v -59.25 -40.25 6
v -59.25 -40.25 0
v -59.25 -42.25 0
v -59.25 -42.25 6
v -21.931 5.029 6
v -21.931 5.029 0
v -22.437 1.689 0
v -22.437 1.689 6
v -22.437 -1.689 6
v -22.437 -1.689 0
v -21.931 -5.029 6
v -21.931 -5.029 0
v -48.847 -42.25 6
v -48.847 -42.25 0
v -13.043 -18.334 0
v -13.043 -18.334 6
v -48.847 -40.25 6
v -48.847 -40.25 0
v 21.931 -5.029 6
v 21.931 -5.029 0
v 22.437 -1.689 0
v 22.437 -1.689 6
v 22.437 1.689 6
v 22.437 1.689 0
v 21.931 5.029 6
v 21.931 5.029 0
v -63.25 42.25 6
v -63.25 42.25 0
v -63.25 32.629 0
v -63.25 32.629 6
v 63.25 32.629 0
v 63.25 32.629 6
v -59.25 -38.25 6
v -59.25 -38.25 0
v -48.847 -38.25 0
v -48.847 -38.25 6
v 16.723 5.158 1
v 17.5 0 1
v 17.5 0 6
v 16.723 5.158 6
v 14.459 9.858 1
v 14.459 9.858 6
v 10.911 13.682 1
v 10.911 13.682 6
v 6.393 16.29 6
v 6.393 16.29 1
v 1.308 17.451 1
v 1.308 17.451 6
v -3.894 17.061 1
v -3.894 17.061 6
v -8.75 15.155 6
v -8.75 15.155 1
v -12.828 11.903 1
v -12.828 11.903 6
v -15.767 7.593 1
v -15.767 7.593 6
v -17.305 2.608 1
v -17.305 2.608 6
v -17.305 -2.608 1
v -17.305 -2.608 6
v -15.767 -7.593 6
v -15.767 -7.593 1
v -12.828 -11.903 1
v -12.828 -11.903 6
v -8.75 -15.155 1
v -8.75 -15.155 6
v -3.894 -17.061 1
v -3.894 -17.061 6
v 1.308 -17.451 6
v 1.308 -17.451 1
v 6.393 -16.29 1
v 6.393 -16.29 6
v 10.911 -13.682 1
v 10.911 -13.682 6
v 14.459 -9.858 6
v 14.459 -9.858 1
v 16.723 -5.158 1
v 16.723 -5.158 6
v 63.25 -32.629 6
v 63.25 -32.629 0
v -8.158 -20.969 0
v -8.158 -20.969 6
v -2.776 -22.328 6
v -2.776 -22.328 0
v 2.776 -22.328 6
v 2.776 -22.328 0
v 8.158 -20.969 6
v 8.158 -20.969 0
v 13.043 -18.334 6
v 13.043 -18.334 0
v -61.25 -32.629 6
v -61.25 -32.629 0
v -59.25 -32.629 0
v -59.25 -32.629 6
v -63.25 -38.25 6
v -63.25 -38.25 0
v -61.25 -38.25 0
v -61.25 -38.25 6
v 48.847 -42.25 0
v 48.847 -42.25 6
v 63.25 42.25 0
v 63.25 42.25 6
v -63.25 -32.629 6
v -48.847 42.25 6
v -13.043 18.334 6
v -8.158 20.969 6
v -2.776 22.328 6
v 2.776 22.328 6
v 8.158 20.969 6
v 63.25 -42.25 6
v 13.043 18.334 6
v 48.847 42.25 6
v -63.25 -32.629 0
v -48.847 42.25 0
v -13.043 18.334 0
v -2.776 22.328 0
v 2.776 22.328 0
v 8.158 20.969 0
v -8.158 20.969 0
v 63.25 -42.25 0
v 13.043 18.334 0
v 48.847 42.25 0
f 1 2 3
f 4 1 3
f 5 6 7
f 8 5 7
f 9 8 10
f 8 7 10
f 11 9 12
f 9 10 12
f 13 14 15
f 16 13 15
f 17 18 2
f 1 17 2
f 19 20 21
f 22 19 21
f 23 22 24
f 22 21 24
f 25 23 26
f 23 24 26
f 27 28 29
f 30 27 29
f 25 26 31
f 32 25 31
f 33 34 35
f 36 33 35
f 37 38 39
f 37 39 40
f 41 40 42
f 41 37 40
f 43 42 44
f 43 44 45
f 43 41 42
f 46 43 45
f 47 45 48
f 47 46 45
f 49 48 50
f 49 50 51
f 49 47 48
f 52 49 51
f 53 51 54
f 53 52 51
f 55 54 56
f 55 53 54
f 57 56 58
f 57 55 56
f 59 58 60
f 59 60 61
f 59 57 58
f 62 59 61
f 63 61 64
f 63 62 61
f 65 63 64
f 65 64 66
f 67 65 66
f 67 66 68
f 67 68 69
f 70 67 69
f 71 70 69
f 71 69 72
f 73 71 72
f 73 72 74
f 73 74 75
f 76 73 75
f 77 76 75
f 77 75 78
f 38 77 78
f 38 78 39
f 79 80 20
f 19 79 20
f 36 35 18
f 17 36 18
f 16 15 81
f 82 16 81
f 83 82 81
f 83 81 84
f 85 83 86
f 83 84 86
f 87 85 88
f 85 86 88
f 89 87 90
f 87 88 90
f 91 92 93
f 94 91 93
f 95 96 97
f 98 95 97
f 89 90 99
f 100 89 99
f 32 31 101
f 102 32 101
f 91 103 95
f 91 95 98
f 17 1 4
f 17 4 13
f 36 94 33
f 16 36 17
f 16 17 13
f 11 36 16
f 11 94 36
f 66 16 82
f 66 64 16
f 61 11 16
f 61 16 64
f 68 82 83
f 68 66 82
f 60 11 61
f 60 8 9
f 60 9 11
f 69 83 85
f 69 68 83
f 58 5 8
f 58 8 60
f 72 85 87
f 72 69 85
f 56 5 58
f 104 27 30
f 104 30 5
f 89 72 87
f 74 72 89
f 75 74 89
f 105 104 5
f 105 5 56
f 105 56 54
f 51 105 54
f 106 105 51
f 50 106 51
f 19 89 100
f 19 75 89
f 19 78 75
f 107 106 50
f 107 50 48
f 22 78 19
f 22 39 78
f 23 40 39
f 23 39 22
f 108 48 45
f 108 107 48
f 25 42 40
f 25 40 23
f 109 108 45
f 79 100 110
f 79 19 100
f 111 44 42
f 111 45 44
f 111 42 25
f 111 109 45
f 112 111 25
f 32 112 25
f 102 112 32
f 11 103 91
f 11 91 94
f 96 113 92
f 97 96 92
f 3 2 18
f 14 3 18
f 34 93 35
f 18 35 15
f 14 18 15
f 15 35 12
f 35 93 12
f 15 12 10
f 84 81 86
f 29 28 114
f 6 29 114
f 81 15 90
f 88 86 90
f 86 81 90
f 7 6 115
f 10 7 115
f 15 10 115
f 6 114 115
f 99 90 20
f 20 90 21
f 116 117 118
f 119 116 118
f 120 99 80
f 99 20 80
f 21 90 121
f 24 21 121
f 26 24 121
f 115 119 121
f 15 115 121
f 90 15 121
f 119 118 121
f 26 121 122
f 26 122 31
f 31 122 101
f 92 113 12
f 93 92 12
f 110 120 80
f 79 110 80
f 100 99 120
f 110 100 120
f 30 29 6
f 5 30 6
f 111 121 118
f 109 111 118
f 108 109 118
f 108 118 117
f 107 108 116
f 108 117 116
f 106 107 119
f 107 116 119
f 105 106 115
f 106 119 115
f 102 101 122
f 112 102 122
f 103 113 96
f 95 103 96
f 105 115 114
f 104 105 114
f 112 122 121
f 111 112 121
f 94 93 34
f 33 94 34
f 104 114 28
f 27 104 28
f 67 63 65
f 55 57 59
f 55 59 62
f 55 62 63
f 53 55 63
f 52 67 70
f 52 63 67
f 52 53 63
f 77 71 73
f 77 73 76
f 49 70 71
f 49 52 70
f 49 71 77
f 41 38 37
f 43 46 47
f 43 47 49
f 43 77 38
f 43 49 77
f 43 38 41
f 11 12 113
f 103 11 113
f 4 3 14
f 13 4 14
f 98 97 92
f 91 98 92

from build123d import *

# Parameters (mm, degrees)
F0_R     = 17.5
F1_DEPTH = 6
F2_DEPTH = 1


with BuildPart() as f1:
    # F0 (on Top) → F1 (new body)
    with BuildSketch(Plane.XY):
        with BuildLine():
            Line((-59.25, -40.25), (-59.25, -42.25))
            Line((-59.25, -42.25), (-48.847482, -42.25))
            Line((-48.847482, -42.25), (-13.043494, -18.333501))
            ThreePointArc((-13.043494, -18.333501), (0, -22.5), (13.043494, -18.333501))
            Line((13.043494, -18.333501), (48.847482, -42.25))
            Line((48.847482, -42.25), (63.25, -42.25))
            Line((63.25, -42.25), (63.25, -32.629346))
            Line((63.25, -32.629346), (21.930829, -5.028793))
            ThreePointArc((21.930829, -5.028793), (22.5, 0), (21.930829, 5.028793))
            Line((21.930829, 5.028793), (63.25, 32.629346))
            Line((63.25, 32.629346), (63.25, 42.25))
            Line((63.25, 42.25), (48.847482, 42.25))
            Line((48.847482, 42.25), (13.043494, 18.333501))
            ThreePointArc((13.043494, 18.333501), (0, 22.5), (-13.043494, 18.333501))
            Line((-13.043494, 18.333501), (-48.847482, 42.25))
            Line((-48.847482, 42.25), (-63.25, 42.25))
            Line((-63.25, 42.25), (-63.25, 32.629346))
            Line((-63.25, 32.629346), (-21.930829, 5.028793))
            ThreePointArc((-21.930829, 5.028793), (-22.5, 0), (-21.930829, -5.028793))
            Line((-21.930829, -5.028793), (-63.25, -32.629346))
            Line((-63.25, -32.629346), (-63.25, -38.25))
            Line((-63.25, -38.25), (-61.25, -38.25))
            Line((-61.25, -38.25), (-61.25, -32.629346))
            Line((-61.25, -32.629346), (-59.25, -32.629346))
            Line((-59.25, -32.629346), (-59.25, -38.25))
            Line((-59.25, -38.25), (-48.847482, -38.25))
            Line((-48.847482, -38.25), (-48.847482, -40.25))
            Line((-48.847482, -40.25), (-59.25, -40.25))
        make_face()
        Circle(F0_R, mode=Mode.SUBTRACT)
    extrude(amount=F1_DEPTH)

    # F0 (on Top) → F2 (join)
    with BuildSketch(Plane.XY):
        Circle(F0_R)
    extrude(amount=F2_DEPTH)


solid = f1.part
